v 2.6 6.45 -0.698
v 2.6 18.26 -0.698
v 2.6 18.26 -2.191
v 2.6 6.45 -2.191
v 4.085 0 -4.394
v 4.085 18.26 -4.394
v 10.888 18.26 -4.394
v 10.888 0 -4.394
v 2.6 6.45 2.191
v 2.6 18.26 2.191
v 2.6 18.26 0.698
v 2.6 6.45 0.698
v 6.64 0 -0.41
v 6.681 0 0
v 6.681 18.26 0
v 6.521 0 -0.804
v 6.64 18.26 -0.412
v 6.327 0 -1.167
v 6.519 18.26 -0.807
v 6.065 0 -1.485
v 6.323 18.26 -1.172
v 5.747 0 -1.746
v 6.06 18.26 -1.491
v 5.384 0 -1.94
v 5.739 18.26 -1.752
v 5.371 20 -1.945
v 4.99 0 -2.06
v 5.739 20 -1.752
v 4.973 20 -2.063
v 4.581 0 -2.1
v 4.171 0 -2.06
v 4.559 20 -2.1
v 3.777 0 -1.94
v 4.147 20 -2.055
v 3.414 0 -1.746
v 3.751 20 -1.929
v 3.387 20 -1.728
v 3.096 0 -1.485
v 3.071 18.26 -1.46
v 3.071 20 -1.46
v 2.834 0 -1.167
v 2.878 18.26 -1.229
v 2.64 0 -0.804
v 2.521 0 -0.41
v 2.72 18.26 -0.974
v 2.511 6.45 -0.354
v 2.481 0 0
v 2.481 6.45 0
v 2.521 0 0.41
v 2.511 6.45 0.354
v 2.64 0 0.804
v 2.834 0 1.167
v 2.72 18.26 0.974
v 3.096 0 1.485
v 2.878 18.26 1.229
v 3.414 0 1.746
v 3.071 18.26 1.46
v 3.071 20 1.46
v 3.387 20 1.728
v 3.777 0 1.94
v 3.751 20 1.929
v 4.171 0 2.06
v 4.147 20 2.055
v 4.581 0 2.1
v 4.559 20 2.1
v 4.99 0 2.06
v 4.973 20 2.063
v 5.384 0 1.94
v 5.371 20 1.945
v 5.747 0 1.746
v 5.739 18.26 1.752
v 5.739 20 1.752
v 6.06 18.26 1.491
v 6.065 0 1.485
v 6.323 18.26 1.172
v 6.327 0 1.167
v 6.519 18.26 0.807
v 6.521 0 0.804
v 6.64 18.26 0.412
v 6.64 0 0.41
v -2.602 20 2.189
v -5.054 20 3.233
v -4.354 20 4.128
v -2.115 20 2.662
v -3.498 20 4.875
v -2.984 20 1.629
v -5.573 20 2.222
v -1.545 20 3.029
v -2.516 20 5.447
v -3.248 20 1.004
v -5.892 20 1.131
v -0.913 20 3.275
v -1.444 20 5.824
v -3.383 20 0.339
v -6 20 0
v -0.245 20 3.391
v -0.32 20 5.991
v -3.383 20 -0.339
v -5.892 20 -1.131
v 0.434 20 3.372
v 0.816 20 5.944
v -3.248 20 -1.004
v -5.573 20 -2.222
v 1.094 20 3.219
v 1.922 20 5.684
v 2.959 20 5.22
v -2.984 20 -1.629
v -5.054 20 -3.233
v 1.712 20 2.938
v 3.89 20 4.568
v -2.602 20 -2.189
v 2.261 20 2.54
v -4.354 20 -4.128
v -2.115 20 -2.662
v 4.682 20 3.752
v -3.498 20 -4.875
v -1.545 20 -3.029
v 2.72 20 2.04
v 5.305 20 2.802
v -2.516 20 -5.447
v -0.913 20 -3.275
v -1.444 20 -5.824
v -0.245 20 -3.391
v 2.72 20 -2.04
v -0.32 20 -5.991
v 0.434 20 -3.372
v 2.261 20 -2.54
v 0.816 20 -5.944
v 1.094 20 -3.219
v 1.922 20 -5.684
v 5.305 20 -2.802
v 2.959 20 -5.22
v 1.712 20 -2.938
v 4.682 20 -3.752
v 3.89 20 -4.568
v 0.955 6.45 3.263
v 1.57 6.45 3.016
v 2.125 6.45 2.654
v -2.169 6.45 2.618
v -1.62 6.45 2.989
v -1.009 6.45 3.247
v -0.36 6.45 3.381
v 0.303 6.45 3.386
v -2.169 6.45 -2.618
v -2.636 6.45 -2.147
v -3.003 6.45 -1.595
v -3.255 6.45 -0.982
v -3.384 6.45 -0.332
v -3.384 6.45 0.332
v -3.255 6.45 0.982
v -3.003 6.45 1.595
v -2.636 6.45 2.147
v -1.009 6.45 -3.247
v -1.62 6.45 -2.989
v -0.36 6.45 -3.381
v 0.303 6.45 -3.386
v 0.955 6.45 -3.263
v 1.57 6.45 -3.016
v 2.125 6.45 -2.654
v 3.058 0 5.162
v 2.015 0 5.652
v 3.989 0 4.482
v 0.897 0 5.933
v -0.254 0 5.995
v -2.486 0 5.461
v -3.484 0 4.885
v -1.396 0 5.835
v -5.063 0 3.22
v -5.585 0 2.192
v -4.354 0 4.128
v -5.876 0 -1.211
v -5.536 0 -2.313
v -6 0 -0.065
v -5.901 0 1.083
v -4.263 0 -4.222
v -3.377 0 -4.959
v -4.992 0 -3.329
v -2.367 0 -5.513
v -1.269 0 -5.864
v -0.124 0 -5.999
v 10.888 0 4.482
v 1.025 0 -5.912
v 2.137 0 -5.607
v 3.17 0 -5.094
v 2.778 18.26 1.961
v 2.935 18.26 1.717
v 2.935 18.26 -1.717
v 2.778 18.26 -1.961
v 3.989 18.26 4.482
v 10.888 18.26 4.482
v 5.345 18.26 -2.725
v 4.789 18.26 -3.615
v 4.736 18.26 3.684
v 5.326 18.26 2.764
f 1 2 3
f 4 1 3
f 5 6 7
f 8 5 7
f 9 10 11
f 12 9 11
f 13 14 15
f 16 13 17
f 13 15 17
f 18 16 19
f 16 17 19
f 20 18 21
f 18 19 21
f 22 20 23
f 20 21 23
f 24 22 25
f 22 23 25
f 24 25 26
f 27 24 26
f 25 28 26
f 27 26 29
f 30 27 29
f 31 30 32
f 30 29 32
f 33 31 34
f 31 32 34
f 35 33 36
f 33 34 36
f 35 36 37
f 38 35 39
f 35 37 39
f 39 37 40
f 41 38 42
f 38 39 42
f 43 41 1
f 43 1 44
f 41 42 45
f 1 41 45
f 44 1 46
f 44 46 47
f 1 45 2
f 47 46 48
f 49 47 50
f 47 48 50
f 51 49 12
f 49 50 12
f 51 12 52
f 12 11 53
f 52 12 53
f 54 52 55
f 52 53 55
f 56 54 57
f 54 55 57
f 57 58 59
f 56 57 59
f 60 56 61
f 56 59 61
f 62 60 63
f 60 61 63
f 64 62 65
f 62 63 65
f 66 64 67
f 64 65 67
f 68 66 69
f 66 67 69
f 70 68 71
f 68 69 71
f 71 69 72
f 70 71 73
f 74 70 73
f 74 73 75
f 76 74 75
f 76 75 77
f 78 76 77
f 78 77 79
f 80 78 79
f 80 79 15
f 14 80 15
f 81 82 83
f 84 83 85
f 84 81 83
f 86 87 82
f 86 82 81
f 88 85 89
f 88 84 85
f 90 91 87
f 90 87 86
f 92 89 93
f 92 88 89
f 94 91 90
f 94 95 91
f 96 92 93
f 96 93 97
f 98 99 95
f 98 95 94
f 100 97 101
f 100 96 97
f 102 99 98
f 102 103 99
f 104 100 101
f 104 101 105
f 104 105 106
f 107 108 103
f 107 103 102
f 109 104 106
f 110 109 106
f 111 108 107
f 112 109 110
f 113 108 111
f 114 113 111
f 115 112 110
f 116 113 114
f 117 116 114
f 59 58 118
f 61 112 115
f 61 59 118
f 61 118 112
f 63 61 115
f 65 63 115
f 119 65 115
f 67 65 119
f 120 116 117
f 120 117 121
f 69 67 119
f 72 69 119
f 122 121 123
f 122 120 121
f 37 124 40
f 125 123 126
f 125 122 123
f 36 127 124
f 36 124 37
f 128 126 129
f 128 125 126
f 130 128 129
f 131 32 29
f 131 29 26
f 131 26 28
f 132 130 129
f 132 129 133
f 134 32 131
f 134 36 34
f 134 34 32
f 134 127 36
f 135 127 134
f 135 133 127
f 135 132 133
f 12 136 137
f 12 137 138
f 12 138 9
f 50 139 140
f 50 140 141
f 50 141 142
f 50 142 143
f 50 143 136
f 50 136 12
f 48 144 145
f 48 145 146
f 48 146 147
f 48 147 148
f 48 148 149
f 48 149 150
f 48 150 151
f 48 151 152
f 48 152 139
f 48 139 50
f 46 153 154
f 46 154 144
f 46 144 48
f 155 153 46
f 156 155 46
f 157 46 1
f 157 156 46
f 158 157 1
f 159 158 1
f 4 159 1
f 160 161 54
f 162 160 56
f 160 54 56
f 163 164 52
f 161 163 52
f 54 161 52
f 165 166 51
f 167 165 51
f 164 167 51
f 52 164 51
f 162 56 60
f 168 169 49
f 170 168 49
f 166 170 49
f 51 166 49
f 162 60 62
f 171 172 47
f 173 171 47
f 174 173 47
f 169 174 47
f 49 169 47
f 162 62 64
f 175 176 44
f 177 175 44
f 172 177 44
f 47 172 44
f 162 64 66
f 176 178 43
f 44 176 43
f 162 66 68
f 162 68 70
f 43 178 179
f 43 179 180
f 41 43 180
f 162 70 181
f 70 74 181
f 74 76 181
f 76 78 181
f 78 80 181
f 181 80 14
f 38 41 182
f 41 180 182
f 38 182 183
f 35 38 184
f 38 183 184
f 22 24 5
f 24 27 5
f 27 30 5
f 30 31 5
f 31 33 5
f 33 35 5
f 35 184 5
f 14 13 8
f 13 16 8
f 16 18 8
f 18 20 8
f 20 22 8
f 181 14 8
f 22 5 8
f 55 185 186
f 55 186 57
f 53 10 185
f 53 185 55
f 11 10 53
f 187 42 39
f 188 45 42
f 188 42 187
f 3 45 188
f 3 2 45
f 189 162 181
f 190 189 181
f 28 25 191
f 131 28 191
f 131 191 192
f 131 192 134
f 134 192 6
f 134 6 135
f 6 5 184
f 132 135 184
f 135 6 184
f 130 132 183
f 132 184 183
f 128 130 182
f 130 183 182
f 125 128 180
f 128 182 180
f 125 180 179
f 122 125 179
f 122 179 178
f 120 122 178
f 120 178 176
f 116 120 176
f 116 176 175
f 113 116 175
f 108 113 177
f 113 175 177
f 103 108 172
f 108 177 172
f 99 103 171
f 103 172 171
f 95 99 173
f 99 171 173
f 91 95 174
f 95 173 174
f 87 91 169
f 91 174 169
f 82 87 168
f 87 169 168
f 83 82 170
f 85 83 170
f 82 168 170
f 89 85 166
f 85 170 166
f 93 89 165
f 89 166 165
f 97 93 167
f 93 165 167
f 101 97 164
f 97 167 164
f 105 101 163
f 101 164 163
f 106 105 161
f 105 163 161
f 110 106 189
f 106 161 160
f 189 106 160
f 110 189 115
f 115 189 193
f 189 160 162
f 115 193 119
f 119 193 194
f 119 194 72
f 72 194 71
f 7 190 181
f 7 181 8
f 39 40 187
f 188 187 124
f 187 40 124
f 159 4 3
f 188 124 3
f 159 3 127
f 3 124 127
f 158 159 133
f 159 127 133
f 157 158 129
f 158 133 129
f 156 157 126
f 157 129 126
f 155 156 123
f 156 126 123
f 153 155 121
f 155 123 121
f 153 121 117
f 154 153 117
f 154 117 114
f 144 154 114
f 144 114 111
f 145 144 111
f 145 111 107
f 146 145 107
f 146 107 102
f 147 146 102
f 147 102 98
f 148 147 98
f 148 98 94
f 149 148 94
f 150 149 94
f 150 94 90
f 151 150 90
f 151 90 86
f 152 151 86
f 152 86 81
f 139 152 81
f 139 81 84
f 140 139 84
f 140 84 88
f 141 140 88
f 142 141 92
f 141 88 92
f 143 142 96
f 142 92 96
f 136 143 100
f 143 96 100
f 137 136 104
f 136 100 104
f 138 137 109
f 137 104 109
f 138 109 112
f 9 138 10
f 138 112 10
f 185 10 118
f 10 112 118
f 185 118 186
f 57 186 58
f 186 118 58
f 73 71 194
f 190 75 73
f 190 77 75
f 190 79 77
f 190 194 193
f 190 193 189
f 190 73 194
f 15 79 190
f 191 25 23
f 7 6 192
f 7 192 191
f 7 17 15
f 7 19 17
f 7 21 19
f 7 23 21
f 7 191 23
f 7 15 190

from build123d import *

# Parameters (mm, degrees)
SKETCH1_R               = 6
BOSS_EXTRUDE1_DEPTH     = 20
SKETCH2_R               = 3.4
CUT_EXTRUDE1_DEPTH      = 13.55
SKETCH5_W               = 8.287891014
SKETCH5_H               = 8.876063753
BOSS_EXTRUDE2_DEPTH     = 18.26
SKETCH8_R               = 2.1
CUT_EXTRUDE6_DEPTH      = 30
CUT_EXTRUDE6_DEPTH_BACK = 30


with BuildPart() as part:
    # Sketch1 → Boss-Extrude1 (new body)
    with BuildSketch(Plane(origin=(0, 0, 0), x_dir=(1, 0, 0), z_dir=(0, 1, 0))):
        Circle(SKETCH1_R)
    extrude(amount=BOSS_EXTRUDE1_DEPTH)

    # Sketch2 → Cut-Extrude1 (cut)
    with BuildSketch(Plane(origin=(0, 20, 0), x_dir=(1, 0, 0), z_dir=(0, 1, 0))):
        Circle(SKETCH2_R)
    extrude(amount=-CUT_EXTRUDE1_DEPTH, mode=Mode.SUBTRACT)

    # Sketch5 → Boss-Extrude2 (add)
    with BuildSketch(Plane(origin=(0, 18.26, 0), x_dir=(1, 0, 0), z_dir=(0, 1, 0))):
        with Locations((6.743945507, -0.04378733)):
            Rectangle(SKETCH5_W, SKETCH5_H)
    extrude(amount=-BOSS_EXTRUDE2_DEPTH)

    # Sketch8 → Cut-Extrude6 (cut, two sides)
    with BuildSketch(Plane(origin=(0, 18.26, 0), x_dir=(1, 0, 0), z_dir=(0, 1, 0))) as cut_extrude6_sk:
        with Locations((4.580522752, 0)):
            Circle(SKETCH8_R)
    extrude(amount=CUT_EXTRUDE6_DEPTH, mode=Mode.SUBTRACT)
    extrude(cut_extrude6_sk.sketch, amount=-CUT_EXTRUDE6_DEPTH_BACK, mode=Mode.SUBTRACT)


solid = part.part
